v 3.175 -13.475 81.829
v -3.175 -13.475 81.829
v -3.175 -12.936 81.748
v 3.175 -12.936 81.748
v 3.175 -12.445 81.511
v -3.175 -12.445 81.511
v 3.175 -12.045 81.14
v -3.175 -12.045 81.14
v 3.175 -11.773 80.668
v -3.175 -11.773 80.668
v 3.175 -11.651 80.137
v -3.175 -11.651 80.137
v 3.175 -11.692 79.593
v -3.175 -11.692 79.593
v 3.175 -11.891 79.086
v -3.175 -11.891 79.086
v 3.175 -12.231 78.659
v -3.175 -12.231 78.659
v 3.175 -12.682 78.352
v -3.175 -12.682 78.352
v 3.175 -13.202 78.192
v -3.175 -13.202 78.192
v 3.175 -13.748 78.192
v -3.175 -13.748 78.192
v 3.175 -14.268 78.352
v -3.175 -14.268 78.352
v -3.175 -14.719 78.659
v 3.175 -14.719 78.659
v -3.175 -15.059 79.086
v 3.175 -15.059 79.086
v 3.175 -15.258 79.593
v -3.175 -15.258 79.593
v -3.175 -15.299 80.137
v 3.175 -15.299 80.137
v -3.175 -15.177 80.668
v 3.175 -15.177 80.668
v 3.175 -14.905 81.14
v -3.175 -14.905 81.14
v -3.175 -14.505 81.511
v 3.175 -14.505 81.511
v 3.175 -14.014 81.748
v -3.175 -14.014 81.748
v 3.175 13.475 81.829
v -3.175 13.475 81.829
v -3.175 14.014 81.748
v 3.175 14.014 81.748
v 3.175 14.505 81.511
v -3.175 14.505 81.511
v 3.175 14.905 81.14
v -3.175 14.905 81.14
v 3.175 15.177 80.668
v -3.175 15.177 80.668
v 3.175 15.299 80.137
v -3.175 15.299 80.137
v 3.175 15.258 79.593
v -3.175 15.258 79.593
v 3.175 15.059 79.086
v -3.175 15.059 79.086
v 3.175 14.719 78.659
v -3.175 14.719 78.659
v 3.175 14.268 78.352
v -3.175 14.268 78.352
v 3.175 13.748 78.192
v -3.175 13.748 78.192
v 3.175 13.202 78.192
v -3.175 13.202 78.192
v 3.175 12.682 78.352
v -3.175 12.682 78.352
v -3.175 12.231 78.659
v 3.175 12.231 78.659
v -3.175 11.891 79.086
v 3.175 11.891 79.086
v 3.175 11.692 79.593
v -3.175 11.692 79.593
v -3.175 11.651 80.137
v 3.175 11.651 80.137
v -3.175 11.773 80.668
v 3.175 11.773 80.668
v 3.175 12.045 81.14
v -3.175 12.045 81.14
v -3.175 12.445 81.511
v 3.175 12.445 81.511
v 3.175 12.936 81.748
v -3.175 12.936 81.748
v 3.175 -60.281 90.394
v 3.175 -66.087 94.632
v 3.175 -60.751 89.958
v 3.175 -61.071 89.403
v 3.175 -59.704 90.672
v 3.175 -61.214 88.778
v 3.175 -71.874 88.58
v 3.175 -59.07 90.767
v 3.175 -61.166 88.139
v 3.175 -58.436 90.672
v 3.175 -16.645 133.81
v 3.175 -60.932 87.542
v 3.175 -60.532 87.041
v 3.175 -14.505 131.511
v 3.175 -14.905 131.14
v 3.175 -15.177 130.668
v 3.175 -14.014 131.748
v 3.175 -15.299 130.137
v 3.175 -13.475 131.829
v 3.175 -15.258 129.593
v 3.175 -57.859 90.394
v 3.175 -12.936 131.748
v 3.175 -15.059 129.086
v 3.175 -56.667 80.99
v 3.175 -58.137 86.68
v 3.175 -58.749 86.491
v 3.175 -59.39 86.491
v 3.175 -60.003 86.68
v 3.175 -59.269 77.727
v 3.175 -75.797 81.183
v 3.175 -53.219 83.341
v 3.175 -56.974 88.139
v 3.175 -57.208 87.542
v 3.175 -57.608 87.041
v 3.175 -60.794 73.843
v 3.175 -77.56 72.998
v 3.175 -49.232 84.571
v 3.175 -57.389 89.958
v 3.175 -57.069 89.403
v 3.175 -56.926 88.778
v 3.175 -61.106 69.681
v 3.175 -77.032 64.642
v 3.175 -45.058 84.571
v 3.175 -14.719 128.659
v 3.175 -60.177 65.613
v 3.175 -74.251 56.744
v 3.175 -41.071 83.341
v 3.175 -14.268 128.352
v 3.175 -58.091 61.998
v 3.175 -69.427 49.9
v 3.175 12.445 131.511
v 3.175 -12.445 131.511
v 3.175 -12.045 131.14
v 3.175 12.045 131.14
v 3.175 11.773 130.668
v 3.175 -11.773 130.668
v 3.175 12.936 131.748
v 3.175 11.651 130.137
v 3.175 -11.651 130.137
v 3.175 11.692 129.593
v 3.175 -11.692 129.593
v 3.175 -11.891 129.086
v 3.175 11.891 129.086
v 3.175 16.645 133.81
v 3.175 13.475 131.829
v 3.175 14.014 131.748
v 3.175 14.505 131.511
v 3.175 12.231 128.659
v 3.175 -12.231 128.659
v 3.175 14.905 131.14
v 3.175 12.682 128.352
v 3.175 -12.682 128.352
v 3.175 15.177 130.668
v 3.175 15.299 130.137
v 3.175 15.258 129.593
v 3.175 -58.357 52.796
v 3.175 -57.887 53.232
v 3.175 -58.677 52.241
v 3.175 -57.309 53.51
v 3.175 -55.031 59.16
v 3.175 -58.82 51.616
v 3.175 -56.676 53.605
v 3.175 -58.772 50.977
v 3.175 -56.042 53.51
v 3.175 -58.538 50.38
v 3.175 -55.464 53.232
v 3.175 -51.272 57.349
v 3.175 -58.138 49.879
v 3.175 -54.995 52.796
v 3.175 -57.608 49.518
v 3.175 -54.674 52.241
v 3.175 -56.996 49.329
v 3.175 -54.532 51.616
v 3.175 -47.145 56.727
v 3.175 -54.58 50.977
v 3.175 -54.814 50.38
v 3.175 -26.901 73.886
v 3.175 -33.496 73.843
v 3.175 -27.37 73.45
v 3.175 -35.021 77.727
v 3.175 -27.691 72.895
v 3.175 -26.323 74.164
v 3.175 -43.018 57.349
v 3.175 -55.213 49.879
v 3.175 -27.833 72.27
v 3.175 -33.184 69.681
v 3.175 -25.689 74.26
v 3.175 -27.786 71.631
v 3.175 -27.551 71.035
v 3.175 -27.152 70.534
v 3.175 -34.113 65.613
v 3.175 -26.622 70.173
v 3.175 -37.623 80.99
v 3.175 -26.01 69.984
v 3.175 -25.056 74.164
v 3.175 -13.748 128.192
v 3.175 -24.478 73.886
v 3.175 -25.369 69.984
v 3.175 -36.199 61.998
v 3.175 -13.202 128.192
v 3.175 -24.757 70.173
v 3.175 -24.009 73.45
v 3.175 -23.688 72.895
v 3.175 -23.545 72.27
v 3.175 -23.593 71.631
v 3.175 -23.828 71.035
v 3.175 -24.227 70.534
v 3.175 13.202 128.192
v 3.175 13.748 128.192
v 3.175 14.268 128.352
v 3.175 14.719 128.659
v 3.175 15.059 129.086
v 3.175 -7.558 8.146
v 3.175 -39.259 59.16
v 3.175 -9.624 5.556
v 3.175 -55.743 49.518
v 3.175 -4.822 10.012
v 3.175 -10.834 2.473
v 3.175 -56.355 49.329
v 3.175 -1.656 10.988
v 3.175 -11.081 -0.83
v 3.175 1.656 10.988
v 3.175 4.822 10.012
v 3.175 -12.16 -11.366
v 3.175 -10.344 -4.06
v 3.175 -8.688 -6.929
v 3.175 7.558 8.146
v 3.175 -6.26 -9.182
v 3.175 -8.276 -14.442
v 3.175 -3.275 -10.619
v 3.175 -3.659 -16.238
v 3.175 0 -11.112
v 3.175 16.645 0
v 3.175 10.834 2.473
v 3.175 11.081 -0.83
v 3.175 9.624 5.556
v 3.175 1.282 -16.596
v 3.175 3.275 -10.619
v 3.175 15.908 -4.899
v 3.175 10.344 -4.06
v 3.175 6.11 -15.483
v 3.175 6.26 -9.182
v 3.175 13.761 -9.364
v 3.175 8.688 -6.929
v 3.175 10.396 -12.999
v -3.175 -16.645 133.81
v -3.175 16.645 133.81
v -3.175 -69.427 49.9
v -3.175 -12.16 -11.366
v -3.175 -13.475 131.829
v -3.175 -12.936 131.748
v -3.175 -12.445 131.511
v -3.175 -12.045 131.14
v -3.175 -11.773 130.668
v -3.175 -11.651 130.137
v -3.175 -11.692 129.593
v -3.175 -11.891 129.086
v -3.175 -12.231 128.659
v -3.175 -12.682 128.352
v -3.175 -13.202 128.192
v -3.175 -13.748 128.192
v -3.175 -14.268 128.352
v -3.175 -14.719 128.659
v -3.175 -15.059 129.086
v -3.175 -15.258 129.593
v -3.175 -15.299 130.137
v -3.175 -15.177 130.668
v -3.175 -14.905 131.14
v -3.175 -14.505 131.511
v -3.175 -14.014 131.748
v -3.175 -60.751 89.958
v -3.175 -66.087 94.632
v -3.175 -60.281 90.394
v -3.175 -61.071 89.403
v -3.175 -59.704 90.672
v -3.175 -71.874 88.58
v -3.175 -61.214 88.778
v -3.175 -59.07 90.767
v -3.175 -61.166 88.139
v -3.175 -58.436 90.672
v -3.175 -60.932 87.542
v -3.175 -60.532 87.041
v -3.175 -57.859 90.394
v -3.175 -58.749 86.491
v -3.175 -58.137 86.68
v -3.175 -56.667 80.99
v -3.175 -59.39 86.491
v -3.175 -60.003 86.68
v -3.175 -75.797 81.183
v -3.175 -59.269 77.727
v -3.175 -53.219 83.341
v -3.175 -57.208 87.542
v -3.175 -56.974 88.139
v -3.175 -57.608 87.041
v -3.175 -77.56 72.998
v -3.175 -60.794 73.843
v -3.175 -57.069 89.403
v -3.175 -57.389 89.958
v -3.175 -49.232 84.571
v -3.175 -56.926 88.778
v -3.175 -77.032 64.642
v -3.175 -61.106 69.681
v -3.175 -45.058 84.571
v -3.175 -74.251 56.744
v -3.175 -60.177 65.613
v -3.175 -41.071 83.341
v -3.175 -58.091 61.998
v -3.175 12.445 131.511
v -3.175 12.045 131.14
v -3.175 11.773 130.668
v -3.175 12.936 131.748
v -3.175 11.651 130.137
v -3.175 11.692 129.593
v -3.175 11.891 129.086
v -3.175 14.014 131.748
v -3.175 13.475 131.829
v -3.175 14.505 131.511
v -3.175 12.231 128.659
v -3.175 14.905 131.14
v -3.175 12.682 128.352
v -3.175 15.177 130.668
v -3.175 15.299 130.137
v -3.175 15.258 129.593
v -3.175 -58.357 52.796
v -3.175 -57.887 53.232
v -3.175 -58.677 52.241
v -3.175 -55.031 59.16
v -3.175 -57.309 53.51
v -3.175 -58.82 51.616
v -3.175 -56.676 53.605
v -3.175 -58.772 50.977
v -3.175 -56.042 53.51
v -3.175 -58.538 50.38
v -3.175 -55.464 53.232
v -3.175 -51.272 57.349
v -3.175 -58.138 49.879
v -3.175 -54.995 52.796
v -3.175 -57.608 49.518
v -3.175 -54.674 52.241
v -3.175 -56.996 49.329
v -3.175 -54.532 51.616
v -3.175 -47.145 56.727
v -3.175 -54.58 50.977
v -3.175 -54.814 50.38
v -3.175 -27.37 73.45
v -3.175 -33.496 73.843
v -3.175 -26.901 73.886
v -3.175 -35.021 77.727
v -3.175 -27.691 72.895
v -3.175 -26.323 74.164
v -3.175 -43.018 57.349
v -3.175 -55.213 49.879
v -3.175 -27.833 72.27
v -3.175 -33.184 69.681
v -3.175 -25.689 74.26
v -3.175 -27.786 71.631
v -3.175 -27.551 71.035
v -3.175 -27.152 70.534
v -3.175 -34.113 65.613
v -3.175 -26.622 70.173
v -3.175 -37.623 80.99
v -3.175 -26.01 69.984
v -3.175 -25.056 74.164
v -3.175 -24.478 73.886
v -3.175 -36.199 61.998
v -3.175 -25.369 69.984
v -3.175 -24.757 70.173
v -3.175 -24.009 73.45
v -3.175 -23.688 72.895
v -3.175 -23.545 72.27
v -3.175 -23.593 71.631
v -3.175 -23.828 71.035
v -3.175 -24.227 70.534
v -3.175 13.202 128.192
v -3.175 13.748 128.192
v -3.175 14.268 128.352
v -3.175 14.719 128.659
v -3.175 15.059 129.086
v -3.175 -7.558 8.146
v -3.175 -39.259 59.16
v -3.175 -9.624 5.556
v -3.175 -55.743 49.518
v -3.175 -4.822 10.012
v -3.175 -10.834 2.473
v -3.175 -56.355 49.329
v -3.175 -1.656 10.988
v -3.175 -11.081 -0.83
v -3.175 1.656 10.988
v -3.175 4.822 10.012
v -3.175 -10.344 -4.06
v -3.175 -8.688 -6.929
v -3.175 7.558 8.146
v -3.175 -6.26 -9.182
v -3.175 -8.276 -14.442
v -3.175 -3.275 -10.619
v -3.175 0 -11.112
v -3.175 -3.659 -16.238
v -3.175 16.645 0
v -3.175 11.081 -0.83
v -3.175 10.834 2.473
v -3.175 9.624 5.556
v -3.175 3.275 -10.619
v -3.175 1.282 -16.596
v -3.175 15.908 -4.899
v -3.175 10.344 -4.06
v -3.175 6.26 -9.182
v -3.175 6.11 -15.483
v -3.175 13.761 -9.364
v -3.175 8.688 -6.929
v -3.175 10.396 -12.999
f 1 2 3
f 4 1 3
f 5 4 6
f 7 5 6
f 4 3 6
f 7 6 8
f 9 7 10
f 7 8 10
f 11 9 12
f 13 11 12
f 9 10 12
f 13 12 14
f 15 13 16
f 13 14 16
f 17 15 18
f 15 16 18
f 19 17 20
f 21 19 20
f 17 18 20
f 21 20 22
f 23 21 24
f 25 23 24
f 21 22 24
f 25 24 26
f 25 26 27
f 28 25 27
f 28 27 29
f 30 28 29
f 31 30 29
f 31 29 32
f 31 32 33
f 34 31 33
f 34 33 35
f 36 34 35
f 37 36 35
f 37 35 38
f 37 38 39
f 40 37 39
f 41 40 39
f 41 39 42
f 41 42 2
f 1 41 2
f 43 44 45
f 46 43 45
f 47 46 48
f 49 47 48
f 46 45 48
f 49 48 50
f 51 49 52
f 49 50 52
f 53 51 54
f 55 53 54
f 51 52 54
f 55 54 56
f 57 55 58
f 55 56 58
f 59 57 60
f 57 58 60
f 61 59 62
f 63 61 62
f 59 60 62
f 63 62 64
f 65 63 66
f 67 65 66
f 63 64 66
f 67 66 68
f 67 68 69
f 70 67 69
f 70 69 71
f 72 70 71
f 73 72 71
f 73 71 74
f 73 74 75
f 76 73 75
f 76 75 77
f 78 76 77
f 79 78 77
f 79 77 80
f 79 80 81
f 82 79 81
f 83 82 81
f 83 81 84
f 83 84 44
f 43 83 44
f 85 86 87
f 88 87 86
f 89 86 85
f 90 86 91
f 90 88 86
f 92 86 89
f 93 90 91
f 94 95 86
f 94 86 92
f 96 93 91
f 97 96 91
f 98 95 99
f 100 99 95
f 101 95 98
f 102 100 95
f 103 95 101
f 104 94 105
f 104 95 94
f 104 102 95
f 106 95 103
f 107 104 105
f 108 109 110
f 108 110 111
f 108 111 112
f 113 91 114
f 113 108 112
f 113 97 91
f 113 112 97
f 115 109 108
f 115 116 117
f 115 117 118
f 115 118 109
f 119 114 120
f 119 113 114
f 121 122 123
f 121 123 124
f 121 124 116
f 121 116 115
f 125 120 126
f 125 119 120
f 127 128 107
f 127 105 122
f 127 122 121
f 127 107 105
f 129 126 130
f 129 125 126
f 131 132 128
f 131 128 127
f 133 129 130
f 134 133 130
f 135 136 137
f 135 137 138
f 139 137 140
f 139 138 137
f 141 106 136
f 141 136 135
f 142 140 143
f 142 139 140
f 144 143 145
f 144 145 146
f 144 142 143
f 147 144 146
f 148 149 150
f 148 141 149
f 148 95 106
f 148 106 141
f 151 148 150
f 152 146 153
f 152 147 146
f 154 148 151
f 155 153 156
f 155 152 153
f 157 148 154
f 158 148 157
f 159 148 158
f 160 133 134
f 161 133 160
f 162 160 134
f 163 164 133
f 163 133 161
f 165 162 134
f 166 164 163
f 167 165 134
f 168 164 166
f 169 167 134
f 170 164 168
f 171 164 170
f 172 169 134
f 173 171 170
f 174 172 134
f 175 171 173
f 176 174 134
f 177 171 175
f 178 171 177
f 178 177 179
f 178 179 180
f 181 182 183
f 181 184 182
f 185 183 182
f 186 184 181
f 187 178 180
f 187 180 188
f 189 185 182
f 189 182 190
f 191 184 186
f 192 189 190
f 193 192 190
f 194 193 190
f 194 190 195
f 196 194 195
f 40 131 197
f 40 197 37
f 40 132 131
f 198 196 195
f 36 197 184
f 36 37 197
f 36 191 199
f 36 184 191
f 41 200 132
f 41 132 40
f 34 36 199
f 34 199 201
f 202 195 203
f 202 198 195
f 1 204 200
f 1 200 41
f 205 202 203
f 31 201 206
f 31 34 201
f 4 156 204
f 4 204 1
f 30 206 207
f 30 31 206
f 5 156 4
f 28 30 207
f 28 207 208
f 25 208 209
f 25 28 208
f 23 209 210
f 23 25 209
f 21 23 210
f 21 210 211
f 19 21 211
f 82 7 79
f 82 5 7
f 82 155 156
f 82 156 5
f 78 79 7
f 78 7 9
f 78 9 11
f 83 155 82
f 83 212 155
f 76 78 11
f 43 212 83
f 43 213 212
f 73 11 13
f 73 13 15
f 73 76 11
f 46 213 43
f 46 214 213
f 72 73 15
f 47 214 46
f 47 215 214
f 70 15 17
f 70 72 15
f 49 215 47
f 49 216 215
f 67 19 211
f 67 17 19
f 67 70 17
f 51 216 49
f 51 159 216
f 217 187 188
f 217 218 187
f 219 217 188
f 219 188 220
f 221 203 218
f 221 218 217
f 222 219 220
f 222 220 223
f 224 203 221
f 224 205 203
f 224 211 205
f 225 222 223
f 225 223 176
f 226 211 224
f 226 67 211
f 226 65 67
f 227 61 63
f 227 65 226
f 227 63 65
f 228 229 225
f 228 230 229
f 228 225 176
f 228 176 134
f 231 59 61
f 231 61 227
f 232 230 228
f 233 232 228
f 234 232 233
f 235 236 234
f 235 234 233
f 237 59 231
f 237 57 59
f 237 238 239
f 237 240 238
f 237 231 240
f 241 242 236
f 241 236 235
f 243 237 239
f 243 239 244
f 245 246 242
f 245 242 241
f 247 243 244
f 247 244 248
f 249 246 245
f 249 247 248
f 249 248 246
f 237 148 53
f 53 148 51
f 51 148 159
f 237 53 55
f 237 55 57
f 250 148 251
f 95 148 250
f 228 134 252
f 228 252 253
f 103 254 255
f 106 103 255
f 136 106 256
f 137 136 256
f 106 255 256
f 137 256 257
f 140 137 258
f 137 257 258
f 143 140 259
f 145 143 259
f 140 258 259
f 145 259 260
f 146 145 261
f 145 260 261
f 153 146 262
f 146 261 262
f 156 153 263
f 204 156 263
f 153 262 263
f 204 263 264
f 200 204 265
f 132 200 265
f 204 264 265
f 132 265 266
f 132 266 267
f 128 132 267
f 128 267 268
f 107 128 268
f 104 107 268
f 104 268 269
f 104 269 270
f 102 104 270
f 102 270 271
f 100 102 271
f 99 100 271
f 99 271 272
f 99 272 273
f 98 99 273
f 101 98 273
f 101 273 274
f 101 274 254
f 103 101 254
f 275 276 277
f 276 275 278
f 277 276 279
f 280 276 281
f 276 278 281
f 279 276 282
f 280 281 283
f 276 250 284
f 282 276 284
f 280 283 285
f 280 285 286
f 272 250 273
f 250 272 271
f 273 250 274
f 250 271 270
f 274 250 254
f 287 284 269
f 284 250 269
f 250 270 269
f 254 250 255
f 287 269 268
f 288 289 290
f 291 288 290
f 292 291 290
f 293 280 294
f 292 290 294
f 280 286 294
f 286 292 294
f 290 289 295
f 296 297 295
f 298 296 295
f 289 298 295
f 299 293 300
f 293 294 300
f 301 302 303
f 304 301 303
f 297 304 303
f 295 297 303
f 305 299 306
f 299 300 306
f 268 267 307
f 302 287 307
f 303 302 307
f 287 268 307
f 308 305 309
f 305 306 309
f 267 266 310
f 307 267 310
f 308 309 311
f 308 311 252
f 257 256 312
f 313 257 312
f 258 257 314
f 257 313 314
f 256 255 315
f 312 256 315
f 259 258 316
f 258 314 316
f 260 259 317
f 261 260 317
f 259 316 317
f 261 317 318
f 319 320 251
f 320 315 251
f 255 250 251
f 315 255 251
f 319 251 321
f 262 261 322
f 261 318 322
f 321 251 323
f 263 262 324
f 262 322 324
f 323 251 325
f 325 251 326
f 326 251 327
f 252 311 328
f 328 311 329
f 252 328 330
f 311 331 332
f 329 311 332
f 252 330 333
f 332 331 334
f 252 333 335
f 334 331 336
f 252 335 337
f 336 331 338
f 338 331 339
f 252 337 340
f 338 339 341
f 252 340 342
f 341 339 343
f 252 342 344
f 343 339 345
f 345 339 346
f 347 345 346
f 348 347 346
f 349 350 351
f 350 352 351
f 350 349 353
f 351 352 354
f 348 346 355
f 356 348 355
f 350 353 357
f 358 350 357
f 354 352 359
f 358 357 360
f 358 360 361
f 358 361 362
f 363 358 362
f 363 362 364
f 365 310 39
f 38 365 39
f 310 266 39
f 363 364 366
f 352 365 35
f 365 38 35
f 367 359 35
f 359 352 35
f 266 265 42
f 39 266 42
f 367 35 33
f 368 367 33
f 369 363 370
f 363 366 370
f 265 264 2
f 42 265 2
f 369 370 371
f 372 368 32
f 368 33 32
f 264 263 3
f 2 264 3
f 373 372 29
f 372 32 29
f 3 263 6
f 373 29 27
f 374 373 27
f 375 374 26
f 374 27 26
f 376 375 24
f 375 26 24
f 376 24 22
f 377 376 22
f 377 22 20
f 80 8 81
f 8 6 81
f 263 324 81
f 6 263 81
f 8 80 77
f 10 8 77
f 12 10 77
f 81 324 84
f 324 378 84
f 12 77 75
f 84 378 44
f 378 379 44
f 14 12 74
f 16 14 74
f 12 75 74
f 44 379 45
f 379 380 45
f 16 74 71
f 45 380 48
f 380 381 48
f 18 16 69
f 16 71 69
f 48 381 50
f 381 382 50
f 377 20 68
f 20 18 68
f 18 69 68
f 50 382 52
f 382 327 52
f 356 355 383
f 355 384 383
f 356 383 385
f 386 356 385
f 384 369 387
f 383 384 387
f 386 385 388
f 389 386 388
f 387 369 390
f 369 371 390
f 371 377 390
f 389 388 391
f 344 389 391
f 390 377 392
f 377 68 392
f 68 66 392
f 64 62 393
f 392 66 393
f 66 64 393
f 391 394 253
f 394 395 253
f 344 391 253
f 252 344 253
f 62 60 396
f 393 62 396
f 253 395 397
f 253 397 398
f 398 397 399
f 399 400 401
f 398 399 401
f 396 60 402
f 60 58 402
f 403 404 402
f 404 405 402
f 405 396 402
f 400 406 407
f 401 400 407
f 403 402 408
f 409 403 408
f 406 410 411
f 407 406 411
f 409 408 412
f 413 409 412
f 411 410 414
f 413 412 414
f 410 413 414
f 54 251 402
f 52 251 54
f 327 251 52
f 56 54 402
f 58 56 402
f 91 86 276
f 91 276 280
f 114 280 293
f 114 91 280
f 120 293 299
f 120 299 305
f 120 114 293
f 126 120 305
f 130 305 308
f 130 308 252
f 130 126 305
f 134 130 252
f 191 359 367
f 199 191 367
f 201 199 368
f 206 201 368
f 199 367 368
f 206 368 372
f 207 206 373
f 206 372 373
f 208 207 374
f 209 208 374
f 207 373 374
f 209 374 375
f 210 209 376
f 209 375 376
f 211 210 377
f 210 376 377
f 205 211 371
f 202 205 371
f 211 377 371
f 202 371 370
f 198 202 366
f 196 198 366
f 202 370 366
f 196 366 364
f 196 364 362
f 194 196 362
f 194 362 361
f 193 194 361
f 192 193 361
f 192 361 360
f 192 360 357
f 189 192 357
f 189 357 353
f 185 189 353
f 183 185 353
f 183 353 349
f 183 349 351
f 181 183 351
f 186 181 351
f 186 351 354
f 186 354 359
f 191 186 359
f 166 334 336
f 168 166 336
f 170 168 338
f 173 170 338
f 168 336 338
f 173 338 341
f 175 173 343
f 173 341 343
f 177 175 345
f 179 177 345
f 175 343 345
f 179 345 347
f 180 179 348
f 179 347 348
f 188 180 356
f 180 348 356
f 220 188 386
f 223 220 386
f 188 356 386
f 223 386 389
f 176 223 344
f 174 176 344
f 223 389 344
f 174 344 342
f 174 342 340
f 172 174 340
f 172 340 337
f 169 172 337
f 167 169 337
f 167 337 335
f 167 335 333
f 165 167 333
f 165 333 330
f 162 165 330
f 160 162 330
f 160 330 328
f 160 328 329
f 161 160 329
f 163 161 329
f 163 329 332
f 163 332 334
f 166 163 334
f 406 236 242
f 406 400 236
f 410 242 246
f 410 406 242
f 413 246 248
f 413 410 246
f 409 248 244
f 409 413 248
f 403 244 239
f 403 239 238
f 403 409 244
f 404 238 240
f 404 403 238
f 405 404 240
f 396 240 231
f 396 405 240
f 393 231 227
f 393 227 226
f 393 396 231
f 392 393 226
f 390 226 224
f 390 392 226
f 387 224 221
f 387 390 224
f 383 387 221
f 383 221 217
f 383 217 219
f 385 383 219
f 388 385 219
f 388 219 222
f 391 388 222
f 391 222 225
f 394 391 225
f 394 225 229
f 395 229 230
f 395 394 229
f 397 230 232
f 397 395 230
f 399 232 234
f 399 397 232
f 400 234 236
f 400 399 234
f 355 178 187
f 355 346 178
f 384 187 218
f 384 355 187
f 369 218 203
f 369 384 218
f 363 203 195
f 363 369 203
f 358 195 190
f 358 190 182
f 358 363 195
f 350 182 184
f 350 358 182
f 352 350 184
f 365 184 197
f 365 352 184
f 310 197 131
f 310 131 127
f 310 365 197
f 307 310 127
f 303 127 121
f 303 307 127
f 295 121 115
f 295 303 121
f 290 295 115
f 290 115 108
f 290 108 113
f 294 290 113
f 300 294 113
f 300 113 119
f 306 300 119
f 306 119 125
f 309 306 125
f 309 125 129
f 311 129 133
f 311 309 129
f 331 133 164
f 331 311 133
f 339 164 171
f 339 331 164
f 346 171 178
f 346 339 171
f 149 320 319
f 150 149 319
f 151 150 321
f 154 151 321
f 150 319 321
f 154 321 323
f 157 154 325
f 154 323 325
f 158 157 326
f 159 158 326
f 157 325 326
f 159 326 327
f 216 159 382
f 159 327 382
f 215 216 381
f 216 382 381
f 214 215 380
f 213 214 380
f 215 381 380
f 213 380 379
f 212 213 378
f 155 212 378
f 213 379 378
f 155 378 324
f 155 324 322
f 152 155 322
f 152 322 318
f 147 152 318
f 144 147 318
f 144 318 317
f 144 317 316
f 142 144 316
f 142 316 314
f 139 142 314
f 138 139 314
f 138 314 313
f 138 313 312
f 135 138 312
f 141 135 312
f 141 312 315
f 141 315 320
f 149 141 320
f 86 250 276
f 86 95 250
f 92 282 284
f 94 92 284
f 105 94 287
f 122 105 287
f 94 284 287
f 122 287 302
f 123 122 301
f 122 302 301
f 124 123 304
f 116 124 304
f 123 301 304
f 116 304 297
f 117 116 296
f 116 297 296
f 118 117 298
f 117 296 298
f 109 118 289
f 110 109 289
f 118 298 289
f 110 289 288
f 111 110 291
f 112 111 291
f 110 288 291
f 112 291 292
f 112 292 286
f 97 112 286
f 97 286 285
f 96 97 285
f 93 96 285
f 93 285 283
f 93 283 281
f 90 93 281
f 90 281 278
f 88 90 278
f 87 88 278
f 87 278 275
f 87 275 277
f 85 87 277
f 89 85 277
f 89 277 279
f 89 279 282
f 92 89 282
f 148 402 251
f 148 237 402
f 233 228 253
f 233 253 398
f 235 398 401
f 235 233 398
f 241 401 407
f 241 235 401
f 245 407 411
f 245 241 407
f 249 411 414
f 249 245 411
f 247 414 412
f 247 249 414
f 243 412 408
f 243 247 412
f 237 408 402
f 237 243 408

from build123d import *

# Parameters (mm, degrees)
SKETCH1_R             = 14
SKETCH1_R_2           = 11.1125
BOSS_EXTRUDE1_DEPTH   = 3.175
F_6_CLEARANCE_HOLE1_D = 3.6576
M4_CLEARANCE_HOLE1_D  = 4.3


with BuildPart() as part:
    # Sketch1 → Boss-Extrude1 (new, symmetric)
    with BuildSketch(Plane(origin=(0, 0, 0), x_dir=(0, 0, -1), z_dir=(1, 0, 0))):
        with BuildLine():
            Line((-133.81, -16.645), (-94.632187648, -66.087166556))
            ThreePointArc((-94.632187648, -66.087166556), (-72.998034274, -77.560353063), (-49.900079745, -69.426774672))
            Line((-49.900079745, -69.426774672), (11.366191703, -12.160004571))
            ThreePointArc((11.366191703, -12.160004571), (15.483205435, 6.109531443), (0, 16.645))
            Line((0, 16.645), (-133.81, 16.645))
            Line((-133.81, 16.645), (-133.81, -16.645))
        make_face()
        with Locations((-70.72728593, -47.145)):
            Circle(SKETCH1_R, mode=Mode.SUBTRACT)
        Circle(SKETCH1_R_2, mode=Mode.SUBTRACT)
    extrude(amount=BOSS_EXTRUDE1_DEPTH, both=True)

    # #6 Clearance Hole1 (through all)
    with Locations(Plane(origin=(3.175, 0, 0), x_dir=(0, 0, -1), z_dir=(1, 0, 0))):
        with Locations((-80, -13.475), (-80, 13.475), (-130, 13.475), (-130, -13.475)):
            Hole(F_6_CLEARANCE_HOLE1_D / 2)

    # M4 Clearance Hole1 (through all)
    with Locations(Plane(origin=(3.175, 0, 0), x_dir=(0, 0, -1), z_dir=(1, 0, 0))):
        with Locations((-72.109641, -25.689485686), (-88.617128841, -59.069911765), (-51.455087948, -56.675602549)):
            Hole(M4_CLEARANCE_HOLE1_D / 2)


solid = part.part
